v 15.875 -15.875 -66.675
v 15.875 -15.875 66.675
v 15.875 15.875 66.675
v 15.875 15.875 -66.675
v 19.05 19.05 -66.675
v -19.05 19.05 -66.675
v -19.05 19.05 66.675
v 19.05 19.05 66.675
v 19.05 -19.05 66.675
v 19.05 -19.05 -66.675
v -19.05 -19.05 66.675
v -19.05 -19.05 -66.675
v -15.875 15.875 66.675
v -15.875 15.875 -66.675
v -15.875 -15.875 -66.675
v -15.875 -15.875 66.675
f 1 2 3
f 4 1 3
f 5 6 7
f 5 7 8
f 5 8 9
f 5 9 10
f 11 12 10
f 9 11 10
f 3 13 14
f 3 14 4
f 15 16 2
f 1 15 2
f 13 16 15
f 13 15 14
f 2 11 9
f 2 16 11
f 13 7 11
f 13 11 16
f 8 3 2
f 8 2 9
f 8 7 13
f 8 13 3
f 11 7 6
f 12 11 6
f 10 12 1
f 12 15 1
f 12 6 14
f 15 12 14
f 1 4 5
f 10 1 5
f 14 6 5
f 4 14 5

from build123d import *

# Parameters (mm, degrees)
SKETCH1_W           = 38.1
SKETCH1_H           = 133.35
BOSS_EXTRUDE1_DEPTH = 19.05
SKETCH2_W           = 31.75
SKETCH2_H           = 31.75
CUT_EXTRUDE1_DEPTH  = 134.35


with BuildPart() as part:
    # Sketch1 → Boss-Extrude1 (new body, symmetric)
    with BuildSketch(Plane(origin=(0, 0, 0), x_dir=(1, 0, 0), z_dir=(0, 1, 0))):
        Rectangle(SKETCH1_W, SKETCH1_H)
    extrude(amount=BOSS_EXTRUDE1_DEPTH, both=True)

    # Sketch2 → Cut-Extrude1 (cut, through all)
    with BuildSketch(Plane.XY.offset(66.675)):
        Rectangle(SKETCH2_W, SKETCH2_H)
    extrude(amount=-CUT_EXTRUDE1_DEPTH, mode=Mode.SUBTRACT)


solid = part.part
